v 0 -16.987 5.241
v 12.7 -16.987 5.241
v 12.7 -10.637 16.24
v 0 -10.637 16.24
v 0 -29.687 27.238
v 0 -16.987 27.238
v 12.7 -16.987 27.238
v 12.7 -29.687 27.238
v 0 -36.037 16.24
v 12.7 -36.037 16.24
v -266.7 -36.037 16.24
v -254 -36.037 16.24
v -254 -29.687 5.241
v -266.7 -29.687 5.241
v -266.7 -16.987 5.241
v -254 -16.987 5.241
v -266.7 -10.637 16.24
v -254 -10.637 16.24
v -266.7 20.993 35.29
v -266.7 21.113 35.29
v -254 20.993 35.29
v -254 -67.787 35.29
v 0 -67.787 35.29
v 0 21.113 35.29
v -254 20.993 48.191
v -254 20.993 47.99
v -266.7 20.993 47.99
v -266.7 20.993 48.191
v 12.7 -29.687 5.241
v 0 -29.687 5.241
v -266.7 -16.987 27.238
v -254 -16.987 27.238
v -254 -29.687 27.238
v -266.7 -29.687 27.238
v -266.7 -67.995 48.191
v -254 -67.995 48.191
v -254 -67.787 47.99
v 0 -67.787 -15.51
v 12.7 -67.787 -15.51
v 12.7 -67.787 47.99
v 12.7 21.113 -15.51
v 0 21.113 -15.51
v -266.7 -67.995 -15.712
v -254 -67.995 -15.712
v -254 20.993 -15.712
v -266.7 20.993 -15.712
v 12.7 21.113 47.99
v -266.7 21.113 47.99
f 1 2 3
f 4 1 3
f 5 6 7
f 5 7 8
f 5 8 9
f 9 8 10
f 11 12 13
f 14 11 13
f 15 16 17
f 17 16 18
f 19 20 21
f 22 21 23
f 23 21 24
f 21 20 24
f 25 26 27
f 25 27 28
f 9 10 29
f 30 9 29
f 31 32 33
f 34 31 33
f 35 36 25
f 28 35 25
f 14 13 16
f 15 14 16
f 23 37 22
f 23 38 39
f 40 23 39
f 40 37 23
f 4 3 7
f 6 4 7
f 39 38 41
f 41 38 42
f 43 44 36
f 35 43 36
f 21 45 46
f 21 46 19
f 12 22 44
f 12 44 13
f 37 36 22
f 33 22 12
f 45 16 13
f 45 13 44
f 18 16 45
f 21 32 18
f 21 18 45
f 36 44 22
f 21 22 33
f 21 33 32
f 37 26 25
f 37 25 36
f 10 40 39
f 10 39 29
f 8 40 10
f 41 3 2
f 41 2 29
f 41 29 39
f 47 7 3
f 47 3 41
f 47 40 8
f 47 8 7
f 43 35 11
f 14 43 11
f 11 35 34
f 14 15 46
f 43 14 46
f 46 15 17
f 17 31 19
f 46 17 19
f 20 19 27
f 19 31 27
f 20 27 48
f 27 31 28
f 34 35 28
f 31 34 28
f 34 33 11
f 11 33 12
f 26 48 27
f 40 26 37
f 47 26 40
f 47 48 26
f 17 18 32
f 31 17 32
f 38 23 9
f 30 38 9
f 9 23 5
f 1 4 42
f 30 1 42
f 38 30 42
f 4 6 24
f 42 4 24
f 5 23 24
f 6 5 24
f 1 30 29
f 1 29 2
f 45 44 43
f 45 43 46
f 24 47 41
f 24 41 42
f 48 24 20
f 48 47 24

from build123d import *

# Parameters (mm, degrees)
F0_W     = 88.9
F0_H     = 63.5
F1_DEPTH = 12.7
F3_W     = 88.9880172908
F3_H     = 63.9023780823
F4_DEPTH = 12.7
F6_W     = 266.7
F6_H     = 88.9
F6_W_2   = 12.7
F7_DEPTH = 12.7
F8_DEPTH = 304.8


with BuildPart() as f1:
    # F0 (on Right) → F1 (new body)
    with BuildSketch(Plane.YZ):
        with Locations((-23.3373962309, 16.2396542728)):
            Rectangle(F0_W, F0_H)
    extrude(amount=F1_DEPTH)



with BuildPart() as f4:
    # F3 (on offset) → F4 (new body)
    with BuildSketch(Plane.YZ.offset(-254)):
        with Locations((-23.5012862831, 16.2396542728)):
            Rectangle(F3_W, F3_H)
    extrude(amount=-F4_DEPTH)


with BuildPart() as f1_1:
    add(f1.part)

    add(f4.part)  # F7 merges F4
    # F6 (on face) → F7 (join)
    with BuildSketch(Plane.XY.offset(47.9896542728)):
        with Locations((-133.35, -23.3373962309)):
            Rectangle(F6_W, F6_H)
        with Locations((6.35, -23.3373962309)):
            Rectangle(F6_W_2, F6_H)
    extrude(amount=-F7_DEPTH)

    # F5 (on face) → F8 (cut)
    with BuildSketch(Plane.YZ.offset(12.7)):
        Polygon((-16.9873962309, 5.2411316447), (-10.6373962309, 16.2396542728), (-16.9873962309, 27.2381769009), (-29.6873962309, 27.2381769009), (-36.0373962309, 16.2396542728), (-29.6873962309, 5.2411316447), align=None)
    extrude(amount=-F8_DEPTH, mode=Mode.SUBTRACT)


solid = f1_1.part
